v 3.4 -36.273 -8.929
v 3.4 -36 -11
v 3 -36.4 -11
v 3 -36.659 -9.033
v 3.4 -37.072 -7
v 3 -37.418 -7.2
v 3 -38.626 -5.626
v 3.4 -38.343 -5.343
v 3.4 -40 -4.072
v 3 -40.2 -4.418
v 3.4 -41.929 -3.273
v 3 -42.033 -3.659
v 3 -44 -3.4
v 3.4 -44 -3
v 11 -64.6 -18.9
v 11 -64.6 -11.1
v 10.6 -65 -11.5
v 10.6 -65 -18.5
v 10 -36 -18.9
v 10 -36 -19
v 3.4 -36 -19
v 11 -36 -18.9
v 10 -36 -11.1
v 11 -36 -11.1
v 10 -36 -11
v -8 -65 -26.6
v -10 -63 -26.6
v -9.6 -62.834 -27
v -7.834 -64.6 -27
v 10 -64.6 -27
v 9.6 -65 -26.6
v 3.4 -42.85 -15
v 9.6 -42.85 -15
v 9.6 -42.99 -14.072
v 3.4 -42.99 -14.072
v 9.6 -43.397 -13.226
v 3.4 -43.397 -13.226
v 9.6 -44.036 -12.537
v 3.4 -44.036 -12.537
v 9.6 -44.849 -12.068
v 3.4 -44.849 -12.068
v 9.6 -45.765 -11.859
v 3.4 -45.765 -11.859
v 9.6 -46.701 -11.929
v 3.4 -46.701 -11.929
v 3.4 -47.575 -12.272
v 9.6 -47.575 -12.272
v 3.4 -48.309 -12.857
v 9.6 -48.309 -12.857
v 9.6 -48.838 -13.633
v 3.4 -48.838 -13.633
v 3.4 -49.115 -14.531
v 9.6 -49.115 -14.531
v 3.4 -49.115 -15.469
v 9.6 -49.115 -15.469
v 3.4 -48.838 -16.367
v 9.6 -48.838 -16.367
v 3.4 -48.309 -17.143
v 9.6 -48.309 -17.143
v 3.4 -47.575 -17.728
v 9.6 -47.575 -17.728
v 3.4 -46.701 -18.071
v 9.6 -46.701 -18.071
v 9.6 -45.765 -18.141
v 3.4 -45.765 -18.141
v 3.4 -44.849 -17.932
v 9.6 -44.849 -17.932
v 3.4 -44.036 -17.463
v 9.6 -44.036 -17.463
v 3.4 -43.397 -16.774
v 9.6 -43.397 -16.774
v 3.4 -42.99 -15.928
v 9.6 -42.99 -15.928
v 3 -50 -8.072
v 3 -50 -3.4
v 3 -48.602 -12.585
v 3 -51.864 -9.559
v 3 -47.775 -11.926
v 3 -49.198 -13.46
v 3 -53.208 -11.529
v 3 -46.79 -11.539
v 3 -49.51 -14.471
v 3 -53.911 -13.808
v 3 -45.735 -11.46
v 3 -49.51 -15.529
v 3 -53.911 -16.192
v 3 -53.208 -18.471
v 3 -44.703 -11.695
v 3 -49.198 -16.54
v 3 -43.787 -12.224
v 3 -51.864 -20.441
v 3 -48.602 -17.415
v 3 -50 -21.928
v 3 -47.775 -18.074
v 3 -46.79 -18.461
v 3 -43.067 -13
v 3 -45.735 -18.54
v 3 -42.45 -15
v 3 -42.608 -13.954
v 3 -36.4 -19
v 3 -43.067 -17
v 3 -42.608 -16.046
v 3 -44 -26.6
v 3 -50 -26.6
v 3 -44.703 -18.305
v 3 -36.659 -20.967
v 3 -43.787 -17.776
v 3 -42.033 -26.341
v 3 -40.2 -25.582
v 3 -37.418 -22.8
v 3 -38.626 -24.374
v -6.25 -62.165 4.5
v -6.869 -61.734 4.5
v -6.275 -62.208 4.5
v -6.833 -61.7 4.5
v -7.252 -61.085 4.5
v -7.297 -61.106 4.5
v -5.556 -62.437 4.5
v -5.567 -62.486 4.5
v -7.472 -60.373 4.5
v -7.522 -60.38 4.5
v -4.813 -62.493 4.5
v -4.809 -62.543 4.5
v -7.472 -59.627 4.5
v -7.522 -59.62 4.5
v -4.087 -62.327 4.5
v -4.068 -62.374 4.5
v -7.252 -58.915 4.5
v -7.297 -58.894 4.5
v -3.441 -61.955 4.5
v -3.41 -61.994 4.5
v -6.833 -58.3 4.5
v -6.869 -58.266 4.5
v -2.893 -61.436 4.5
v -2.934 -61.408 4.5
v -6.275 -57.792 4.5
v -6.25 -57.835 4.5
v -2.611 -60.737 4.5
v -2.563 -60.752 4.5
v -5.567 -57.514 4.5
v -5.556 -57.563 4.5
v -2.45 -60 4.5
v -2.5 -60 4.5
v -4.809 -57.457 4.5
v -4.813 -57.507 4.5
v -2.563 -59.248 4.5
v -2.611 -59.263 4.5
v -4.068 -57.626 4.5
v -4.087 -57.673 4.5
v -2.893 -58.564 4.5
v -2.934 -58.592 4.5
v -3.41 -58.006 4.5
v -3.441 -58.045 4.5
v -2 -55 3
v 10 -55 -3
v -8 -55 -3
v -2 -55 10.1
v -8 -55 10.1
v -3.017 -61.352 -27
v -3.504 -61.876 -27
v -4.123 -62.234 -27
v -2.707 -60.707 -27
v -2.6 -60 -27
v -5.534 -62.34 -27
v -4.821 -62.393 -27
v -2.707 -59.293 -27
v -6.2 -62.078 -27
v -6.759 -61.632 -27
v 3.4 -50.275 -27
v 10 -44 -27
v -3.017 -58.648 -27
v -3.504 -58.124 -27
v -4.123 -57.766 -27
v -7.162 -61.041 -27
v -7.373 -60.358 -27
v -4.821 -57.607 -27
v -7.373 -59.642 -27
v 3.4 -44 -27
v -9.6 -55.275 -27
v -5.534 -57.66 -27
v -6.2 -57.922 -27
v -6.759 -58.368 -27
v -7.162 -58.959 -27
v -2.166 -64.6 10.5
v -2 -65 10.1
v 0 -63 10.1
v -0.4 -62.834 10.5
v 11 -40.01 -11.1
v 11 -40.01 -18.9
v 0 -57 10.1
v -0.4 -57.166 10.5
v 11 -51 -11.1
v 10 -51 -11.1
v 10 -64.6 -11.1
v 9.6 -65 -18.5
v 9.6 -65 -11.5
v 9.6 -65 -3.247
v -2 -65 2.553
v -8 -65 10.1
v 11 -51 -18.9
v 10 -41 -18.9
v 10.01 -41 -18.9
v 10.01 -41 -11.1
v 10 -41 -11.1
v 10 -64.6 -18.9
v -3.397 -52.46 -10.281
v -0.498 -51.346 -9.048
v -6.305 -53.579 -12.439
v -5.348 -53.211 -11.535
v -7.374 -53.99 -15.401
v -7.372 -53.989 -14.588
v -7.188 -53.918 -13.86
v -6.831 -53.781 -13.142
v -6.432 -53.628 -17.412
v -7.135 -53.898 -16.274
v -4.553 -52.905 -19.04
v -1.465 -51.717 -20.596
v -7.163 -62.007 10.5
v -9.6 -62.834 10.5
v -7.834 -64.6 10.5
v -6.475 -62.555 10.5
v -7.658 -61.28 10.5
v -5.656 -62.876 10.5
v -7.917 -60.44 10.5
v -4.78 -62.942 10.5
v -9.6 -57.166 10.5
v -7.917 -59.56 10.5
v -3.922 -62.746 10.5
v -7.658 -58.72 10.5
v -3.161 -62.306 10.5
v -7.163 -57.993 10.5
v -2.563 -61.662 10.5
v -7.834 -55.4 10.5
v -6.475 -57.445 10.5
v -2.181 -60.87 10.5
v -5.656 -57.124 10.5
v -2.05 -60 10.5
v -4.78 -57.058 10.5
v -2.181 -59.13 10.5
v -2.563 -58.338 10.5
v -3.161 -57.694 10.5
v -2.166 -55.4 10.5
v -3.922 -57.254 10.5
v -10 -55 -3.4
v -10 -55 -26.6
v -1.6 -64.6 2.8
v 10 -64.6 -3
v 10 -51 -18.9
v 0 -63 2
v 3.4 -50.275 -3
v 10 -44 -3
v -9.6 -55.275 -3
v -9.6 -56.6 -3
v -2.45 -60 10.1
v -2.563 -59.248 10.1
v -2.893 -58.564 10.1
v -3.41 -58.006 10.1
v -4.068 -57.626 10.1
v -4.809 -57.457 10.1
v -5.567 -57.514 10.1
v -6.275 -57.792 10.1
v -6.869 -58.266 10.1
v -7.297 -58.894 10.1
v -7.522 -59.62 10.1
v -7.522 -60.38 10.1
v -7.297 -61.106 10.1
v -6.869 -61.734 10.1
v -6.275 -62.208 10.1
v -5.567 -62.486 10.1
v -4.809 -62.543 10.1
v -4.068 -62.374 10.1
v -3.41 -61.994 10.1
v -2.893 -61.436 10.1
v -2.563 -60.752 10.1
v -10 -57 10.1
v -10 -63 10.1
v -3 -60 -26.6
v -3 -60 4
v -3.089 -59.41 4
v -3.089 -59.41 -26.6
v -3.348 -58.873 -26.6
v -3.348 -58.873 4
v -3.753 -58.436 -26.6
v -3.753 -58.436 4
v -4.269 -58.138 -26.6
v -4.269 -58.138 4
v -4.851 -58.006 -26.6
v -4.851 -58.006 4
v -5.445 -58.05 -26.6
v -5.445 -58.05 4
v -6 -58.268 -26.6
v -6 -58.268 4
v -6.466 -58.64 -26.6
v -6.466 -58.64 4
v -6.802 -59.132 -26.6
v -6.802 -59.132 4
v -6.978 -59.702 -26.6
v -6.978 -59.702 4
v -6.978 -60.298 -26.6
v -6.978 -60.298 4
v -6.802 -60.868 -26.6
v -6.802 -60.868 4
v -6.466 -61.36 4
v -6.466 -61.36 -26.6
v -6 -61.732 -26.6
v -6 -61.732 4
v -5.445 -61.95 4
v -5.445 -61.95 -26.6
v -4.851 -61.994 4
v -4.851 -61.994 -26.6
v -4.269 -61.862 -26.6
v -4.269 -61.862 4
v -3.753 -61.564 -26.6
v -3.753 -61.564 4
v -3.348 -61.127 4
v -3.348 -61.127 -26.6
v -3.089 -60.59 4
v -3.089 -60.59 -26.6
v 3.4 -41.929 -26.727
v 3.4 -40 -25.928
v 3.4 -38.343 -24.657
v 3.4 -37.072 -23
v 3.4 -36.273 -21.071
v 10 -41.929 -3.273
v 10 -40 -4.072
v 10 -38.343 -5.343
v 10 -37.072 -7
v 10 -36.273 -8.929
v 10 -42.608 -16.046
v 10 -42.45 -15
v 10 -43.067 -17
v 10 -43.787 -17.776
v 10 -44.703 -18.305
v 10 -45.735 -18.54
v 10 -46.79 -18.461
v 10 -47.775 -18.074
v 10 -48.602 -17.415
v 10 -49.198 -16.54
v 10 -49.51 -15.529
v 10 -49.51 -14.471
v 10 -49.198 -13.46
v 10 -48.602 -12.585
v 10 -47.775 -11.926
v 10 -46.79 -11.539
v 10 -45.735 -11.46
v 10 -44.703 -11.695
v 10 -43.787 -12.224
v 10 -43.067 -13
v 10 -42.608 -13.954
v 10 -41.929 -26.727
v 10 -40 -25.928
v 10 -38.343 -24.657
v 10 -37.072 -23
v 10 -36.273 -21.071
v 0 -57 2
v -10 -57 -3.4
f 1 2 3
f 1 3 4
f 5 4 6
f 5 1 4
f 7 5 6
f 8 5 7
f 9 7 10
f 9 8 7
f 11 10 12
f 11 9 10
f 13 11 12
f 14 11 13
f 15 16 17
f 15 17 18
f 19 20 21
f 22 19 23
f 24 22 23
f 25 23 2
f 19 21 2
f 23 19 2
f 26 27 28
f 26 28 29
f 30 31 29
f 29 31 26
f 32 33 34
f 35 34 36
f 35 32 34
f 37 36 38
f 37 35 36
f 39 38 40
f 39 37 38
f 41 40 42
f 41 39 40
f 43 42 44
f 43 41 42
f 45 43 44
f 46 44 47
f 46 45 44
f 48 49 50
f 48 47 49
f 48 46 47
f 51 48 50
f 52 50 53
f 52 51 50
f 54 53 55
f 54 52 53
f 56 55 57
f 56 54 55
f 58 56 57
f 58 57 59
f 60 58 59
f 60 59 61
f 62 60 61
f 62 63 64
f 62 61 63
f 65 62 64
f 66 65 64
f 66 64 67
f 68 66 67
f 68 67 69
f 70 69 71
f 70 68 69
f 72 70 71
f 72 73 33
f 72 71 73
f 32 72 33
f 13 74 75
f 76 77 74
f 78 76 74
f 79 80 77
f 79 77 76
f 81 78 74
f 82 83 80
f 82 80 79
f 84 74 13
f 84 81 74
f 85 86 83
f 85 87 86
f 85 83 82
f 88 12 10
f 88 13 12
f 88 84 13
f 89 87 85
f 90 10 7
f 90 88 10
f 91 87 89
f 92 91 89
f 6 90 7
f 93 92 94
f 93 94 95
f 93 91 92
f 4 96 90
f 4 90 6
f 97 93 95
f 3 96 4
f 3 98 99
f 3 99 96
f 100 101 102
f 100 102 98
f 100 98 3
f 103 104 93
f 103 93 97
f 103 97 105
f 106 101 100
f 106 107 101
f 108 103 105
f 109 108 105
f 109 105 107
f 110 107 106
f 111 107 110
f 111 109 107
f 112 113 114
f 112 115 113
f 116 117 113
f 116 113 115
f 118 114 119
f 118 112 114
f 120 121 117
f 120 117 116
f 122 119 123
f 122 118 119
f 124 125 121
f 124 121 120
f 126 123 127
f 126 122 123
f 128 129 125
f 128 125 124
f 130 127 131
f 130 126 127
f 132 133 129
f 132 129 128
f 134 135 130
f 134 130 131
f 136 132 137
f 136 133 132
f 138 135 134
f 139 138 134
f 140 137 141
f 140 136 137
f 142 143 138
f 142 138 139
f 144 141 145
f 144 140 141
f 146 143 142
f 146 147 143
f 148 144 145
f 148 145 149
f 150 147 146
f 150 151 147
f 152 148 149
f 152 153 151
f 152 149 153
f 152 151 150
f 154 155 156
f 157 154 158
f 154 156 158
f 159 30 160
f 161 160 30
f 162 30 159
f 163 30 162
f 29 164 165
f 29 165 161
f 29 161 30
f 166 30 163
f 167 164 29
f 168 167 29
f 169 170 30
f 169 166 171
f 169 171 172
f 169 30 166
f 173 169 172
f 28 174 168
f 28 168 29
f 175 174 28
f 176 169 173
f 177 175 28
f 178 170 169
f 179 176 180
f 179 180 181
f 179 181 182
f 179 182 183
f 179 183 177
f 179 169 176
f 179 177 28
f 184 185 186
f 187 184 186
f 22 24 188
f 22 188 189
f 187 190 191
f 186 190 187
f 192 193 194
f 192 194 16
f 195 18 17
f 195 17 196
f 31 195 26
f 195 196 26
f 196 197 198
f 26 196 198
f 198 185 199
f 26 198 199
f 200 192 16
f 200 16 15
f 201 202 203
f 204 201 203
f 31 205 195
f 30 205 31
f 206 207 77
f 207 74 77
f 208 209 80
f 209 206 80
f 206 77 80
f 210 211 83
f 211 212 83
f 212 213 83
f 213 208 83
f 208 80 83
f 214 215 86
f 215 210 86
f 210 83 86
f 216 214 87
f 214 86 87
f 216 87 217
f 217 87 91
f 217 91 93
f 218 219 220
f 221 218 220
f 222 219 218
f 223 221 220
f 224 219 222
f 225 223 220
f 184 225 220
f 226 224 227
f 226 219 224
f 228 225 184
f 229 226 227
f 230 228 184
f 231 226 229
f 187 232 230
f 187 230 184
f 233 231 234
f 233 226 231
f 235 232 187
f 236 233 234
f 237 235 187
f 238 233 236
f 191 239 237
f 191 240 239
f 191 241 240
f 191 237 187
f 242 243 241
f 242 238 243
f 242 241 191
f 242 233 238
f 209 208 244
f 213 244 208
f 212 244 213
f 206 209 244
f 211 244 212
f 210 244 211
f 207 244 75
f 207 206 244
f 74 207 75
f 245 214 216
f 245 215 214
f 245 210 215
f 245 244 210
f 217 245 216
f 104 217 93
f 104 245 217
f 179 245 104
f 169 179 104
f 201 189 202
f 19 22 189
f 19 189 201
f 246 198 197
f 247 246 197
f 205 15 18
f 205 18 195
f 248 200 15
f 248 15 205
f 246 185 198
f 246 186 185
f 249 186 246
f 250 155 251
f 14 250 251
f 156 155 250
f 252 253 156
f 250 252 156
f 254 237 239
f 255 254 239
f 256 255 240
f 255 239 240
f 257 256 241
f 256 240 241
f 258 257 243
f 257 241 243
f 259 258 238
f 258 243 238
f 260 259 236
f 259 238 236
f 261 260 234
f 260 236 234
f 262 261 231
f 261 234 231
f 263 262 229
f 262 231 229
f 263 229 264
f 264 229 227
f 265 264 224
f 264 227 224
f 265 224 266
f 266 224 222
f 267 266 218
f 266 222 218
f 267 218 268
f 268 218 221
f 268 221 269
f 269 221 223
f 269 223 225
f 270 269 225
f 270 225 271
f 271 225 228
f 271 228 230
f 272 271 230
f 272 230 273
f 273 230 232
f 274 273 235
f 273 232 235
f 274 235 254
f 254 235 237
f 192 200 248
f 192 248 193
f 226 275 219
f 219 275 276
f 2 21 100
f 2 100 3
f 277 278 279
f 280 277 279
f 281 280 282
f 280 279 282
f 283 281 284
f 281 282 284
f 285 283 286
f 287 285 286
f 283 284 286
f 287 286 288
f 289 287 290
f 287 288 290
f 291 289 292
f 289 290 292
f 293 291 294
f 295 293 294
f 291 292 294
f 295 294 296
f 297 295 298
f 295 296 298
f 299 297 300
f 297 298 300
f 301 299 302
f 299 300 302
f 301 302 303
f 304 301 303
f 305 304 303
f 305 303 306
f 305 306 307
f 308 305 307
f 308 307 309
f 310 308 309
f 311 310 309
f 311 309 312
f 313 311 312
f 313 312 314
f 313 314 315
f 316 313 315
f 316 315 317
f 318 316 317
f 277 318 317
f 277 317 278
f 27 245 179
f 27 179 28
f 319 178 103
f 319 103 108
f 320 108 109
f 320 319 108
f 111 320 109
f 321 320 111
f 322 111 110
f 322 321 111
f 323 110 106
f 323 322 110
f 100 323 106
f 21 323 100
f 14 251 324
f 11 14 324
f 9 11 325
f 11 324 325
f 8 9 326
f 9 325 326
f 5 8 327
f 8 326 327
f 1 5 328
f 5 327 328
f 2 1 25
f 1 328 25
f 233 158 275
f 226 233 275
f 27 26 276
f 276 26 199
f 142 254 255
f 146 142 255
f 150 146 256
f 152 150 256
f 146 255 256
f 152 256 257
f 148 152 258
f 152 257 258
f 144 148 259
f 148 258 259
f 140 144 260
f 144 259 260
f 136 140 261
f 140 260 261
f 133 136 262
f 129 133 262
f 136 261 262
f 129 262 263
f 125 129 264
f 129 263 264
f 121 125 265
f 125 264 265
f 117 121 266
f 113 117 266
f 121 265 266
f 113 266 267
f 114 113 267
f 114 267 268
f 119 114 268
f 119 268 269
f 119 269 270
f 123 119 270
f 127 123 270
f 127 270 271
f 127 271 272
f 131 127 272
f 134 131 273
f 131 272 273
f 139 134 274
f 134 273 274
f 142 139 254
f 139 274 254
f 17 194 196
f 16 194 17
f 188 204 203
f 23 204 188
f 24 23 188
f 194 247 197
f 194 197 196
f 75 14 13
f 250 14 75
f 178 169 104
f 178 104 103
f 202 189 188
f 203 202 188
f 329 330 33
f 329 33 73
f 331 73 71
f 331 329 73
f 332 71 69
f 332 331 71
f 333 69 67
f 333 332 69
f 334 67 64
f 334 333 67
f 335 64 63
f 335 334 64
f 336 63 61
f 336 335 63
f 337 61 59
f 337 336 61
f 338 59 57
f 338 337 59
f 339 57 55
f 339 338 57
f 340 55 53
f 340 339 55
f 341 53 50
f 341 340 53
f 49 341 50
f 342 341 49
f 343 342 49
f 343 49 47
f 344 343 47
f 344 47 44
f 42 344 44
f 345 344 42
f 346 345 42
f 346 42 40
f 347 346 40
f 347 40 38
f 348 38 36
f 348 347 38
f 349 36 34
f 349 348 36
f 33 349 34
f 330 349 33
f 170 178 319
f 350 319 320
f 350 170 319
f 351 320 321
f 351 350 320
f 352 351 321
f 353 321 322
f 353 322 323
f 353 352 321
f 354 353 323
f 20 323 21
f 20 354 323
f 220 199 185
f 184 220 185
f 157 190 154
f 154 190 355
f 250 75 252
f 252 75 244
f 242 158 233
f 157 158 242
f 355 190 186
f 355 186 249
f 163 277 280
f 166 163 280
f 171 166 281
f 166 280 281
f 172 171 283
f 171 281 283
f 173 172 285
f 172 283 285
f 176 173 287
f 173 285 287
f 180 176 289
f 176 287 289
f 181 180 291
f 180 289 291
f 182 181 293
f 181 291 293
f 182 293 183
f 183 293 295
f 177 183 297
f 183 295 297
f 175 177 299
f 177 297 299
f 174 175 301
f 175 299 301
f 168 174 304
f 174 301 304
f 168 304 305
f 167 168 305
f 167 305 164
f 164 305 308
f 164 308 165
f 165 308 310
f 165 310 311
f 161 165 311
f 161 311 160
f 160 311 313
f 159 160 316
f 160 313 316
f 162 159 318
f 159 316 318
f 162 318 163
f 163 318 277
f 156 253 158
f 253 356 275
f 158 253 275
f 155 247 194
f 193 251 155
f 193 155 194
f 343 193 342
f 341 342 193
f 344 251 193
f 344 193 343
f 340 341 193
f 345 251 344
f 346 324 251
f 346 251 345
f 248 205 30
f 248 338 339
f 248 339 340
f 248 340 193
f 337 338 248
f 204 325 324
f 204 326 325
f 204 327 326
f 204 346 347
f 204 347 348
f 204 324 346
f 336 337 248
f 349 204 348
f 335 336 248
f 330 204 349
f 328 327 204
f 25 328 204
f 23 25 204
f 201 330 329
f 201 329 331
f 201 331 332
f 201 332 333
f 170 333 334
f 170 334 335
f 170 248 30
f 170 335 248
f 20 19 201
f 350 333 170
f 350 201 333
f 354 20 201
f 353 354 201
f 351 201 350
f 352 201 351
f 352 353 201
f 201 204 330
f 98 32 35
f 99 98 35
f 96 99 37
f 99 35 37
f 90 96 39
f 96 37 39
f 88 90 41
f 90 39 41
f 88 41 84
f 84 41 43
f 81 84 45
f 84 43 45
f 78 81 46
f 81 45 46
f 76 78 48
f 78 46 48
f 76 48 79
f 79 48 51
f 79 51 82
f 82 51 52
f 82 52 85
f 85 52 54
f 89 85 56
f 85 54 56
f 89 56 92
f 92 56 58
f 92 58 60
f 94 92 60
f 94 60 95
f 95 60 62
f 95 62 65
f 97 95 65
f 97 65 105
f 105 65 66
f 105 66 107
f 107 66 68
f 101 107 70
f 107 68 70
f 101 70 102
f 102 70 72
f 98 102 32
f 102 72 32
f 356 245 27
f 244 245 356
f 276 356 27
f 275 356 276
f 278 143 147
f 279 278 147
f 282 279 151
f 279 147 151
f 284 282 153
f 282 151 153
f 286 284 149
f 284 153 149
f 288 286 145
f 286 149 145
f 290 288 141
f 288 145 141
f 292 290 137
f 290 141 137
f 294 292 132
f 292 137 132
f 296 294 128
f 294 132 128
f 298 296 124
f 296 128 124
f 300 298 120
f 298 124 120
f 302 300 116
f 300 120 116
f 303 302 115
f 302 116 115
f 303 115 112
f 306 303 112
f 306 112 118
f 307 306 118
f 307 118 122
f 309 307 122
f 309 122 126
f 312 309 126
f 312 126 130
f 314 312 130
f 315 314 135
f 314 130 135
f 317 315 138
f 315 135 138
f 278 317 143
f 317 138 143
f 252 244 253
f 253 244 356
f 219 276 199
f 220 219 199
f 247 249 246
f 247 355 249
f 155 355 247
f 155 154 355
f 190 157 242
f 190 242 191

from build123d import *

# Parameters (mm, degrees)
PAD008_DEPTH       = 40
SKETCH033_W        = 30
SKETCH033_H        = 13.5
POCKET020_DEPTH    = 21.001
POCKET021_DEPTH    = 37.501
SKETCH035_R        = 8
POCKET022_DEPTH    = 13.001
SKETCH036_R        = 3.15
POCKET023_DEPTH    = 8.001
SKETCH037_W        = 11
SKETCH037_H        = 24
POCKET024_DEPTH    = 8.001
FILLET003002004_R  = 8
SKETCH038_R        = 2
POCKET025_DEPTH    = 37.501
SKETCH039_R        = 2.55
POCKET026_DEPTH    = 6
SKETCH040_W        = 10
SKETCH040_H        = 8
POCKET027_DEPTH    = 1
CHAMFER026013_SIZE = 2
CHAMFER026014_SIZE = 0.4
CHAMFER026015_SIZE = 0.99
CHAMFER026016_SIZE = 0.5


with BuildPart() as part:
    # Sketch032 → Pad008 (new body)
    with BuildSketch(Plane.XZ):
        Polygon((-20, 10.5), (-10, 10.5), (-10, 2), (0, -3), (0, -11.1), (1, -11.1), (1, -18.9), (0, -18.9), (0, -27), (-20, -27), align=None)
    extrude(amount=PAD008_DEPTH)

    # Sketch033 (on DatumPlane) → Pocket020 (cut, through all)
    with BuildSketch(Plane.YZ.offset(-20)):
        with Locations((-15, 3.75)):
            Rectangle(SKETCH033_W, SKETCH033_H)
    extrude(amount=POCKET020_DEPTH, mode=Mode.SUBTRACT)

    # Sketch034 (on DatumPlane) → Pocket021 (cut, through all)
    with BuildSketch(Plane.XY.offset(-27)):
        Polygon((-20, -30), (-7, -25), (-7, 0), (-20, 0), align=None)
    extrude(amount=POCKET021_DEPTH, mode=Mode.SUBTRACT)

    # Sketch035 (on DatumPlane) → Pocket022 (cut, through all)
    with BuildSketch(Plane.YZ.offset(-7)):
        with Locations((-21, -15)):
            Circle(SKETCH035_R)
    extrude(amount=-POCKET022_DEPTH, mode=Mode.SUBTRACT)

    # Sketch036 (on DatumPlane) → Pocket023 (cut, through all)
    with BuildSketch(Plane.YZ.offset(-7)):
        with Locations((-21, -15)):
            Circle(SKETCH036_R)
    extrude(amount=POCKET023_DEPTH, mode=Mode.SUBTRACT)

    # Sketch037 (on DatumPlane) → Pocket024 (cut, through all)
    with BuildSketch(Plane.YZ.offset(-7)):
        with Locations((-5.5, -15)):
            Rectangle(SKETCH037_W, SKETCH037_H)
    extrude(amount=POCKET024_DEPTH, mode=Mode.SUBTRACT)

    # Fillet003002004
    fillet003002004_edges = [part.edges().sort_by_distance(p)[0] for p in [
        (-3.5, -11, -27),
        (-3.5, -11, -3),
    ]]
    fillet(fillet003002004_edges, radius=FILLET003002004_R)

    # Sketch038 (on DatumPlane) → Pocket025 (cut, through all)
    with BuildSketch(Plane.XY.offset(10.5)):
        with Locations((-15, -35)):
            Circle(SKETCH038_R)
    extrude(amount=-POCKET025_DEPTH, mode=Mode.SUBTRACT)

    # Sketch039 (on DatumPlane) → Pocket026 (cut)
    with BuildSketch(Plane.XY.offset(10.5)):
        with Locations((-15, -35)):
            Circle(SKETCH039_R)
    extrude(amount=-POCKET026_DEPTH, mode=Mode.SUBTRACT)

    # Sketch040 (on DatumPlane) → Pocket027 (cut)
    with BuildSketch(Plane.YZ.offset(1)):
        with Locations((-21, -15)):
            Rectangle(SKETCH040_W, SKETCH040_H)
    extrude(amount=-POCKET027_DEPTH, mode=Mode.SUBTRACT)

    # Chamfer026013
    chamfer026013_edges = [part.edges().sort_by_distance(p)[0] for p in [
        (-10, -40, 6.25),
        (-20, -40, -8.25),
        (-10, -30, 6.25),
        (-20, -30, 3.75),
    ]]
    chamfer(chamfer026013_edges, length=CHAMFER026013_SIZE)

    # Chamfer026014
    chamfer026014_edges = [part.edges().sort_by_distance(p)[0] for p in [
        (-9, -40, -27),
        (0, -40, -22.95),
        (0.5, -40, -18.9),
        (1, -40, -15),
        (0.5, -40, -11.1),
        (0, -40, -7.05),
        (-19, -39, -27),
        (-20, -34, -27),
        (-13.5, -27.5, -27),
        (-7, -22, -27),
        (-7, -13.343146, -24.656854),
        (-7, -11, -15),
        (-7, -13.343146, -5.343146),
        (-7, -22, -3),
        (-13.5, -27.5, -3),
        (-20, -31, -3),
        (-7, -24.15, -15),
        (0, -24.15, -15),
        (-17, -35, -27),
        (-15, -40, 10.5),
        (-19, -39, 10.5),
        (-20, -35, 10.5),
        (-19, -31, 10.5),
        (-15, -30, 10.5),
        (-11, -31, 10.5),
        (-10, -35, 10.5),
        (-11, -39, 10.5),
        (-17.55, -35, 10.5),
        (-5, -40, -0.5),
        (-11, -40, 2.5),
    ]]
    chamfer(chamfer026014_edges, length=CHAMFER026014_SIZE)

    # Chamfer026015
    chamfer026015_edges = [part.edges().sort_by_distance(p)[0] for p in [
        (1, -16, -15),
    ]]
    chamfer(chamfer026015_edges, length=CHAMFER026015_SIZE)

    # Chamfer026016
    chamfer026016_edges = [part.edges().sort_by_distance(p)[0] for p in [
        (-17, -35, 4.5),
    ]]
    chamfer(chamfer026016_edges, length=CHAMFER026016_SIZE)


with BuildPart() as part_1:
    # Body001001001002003006 placement: moved
    add(part.part.moved(Location((10, -25, 0))))


solid = part_1.part
